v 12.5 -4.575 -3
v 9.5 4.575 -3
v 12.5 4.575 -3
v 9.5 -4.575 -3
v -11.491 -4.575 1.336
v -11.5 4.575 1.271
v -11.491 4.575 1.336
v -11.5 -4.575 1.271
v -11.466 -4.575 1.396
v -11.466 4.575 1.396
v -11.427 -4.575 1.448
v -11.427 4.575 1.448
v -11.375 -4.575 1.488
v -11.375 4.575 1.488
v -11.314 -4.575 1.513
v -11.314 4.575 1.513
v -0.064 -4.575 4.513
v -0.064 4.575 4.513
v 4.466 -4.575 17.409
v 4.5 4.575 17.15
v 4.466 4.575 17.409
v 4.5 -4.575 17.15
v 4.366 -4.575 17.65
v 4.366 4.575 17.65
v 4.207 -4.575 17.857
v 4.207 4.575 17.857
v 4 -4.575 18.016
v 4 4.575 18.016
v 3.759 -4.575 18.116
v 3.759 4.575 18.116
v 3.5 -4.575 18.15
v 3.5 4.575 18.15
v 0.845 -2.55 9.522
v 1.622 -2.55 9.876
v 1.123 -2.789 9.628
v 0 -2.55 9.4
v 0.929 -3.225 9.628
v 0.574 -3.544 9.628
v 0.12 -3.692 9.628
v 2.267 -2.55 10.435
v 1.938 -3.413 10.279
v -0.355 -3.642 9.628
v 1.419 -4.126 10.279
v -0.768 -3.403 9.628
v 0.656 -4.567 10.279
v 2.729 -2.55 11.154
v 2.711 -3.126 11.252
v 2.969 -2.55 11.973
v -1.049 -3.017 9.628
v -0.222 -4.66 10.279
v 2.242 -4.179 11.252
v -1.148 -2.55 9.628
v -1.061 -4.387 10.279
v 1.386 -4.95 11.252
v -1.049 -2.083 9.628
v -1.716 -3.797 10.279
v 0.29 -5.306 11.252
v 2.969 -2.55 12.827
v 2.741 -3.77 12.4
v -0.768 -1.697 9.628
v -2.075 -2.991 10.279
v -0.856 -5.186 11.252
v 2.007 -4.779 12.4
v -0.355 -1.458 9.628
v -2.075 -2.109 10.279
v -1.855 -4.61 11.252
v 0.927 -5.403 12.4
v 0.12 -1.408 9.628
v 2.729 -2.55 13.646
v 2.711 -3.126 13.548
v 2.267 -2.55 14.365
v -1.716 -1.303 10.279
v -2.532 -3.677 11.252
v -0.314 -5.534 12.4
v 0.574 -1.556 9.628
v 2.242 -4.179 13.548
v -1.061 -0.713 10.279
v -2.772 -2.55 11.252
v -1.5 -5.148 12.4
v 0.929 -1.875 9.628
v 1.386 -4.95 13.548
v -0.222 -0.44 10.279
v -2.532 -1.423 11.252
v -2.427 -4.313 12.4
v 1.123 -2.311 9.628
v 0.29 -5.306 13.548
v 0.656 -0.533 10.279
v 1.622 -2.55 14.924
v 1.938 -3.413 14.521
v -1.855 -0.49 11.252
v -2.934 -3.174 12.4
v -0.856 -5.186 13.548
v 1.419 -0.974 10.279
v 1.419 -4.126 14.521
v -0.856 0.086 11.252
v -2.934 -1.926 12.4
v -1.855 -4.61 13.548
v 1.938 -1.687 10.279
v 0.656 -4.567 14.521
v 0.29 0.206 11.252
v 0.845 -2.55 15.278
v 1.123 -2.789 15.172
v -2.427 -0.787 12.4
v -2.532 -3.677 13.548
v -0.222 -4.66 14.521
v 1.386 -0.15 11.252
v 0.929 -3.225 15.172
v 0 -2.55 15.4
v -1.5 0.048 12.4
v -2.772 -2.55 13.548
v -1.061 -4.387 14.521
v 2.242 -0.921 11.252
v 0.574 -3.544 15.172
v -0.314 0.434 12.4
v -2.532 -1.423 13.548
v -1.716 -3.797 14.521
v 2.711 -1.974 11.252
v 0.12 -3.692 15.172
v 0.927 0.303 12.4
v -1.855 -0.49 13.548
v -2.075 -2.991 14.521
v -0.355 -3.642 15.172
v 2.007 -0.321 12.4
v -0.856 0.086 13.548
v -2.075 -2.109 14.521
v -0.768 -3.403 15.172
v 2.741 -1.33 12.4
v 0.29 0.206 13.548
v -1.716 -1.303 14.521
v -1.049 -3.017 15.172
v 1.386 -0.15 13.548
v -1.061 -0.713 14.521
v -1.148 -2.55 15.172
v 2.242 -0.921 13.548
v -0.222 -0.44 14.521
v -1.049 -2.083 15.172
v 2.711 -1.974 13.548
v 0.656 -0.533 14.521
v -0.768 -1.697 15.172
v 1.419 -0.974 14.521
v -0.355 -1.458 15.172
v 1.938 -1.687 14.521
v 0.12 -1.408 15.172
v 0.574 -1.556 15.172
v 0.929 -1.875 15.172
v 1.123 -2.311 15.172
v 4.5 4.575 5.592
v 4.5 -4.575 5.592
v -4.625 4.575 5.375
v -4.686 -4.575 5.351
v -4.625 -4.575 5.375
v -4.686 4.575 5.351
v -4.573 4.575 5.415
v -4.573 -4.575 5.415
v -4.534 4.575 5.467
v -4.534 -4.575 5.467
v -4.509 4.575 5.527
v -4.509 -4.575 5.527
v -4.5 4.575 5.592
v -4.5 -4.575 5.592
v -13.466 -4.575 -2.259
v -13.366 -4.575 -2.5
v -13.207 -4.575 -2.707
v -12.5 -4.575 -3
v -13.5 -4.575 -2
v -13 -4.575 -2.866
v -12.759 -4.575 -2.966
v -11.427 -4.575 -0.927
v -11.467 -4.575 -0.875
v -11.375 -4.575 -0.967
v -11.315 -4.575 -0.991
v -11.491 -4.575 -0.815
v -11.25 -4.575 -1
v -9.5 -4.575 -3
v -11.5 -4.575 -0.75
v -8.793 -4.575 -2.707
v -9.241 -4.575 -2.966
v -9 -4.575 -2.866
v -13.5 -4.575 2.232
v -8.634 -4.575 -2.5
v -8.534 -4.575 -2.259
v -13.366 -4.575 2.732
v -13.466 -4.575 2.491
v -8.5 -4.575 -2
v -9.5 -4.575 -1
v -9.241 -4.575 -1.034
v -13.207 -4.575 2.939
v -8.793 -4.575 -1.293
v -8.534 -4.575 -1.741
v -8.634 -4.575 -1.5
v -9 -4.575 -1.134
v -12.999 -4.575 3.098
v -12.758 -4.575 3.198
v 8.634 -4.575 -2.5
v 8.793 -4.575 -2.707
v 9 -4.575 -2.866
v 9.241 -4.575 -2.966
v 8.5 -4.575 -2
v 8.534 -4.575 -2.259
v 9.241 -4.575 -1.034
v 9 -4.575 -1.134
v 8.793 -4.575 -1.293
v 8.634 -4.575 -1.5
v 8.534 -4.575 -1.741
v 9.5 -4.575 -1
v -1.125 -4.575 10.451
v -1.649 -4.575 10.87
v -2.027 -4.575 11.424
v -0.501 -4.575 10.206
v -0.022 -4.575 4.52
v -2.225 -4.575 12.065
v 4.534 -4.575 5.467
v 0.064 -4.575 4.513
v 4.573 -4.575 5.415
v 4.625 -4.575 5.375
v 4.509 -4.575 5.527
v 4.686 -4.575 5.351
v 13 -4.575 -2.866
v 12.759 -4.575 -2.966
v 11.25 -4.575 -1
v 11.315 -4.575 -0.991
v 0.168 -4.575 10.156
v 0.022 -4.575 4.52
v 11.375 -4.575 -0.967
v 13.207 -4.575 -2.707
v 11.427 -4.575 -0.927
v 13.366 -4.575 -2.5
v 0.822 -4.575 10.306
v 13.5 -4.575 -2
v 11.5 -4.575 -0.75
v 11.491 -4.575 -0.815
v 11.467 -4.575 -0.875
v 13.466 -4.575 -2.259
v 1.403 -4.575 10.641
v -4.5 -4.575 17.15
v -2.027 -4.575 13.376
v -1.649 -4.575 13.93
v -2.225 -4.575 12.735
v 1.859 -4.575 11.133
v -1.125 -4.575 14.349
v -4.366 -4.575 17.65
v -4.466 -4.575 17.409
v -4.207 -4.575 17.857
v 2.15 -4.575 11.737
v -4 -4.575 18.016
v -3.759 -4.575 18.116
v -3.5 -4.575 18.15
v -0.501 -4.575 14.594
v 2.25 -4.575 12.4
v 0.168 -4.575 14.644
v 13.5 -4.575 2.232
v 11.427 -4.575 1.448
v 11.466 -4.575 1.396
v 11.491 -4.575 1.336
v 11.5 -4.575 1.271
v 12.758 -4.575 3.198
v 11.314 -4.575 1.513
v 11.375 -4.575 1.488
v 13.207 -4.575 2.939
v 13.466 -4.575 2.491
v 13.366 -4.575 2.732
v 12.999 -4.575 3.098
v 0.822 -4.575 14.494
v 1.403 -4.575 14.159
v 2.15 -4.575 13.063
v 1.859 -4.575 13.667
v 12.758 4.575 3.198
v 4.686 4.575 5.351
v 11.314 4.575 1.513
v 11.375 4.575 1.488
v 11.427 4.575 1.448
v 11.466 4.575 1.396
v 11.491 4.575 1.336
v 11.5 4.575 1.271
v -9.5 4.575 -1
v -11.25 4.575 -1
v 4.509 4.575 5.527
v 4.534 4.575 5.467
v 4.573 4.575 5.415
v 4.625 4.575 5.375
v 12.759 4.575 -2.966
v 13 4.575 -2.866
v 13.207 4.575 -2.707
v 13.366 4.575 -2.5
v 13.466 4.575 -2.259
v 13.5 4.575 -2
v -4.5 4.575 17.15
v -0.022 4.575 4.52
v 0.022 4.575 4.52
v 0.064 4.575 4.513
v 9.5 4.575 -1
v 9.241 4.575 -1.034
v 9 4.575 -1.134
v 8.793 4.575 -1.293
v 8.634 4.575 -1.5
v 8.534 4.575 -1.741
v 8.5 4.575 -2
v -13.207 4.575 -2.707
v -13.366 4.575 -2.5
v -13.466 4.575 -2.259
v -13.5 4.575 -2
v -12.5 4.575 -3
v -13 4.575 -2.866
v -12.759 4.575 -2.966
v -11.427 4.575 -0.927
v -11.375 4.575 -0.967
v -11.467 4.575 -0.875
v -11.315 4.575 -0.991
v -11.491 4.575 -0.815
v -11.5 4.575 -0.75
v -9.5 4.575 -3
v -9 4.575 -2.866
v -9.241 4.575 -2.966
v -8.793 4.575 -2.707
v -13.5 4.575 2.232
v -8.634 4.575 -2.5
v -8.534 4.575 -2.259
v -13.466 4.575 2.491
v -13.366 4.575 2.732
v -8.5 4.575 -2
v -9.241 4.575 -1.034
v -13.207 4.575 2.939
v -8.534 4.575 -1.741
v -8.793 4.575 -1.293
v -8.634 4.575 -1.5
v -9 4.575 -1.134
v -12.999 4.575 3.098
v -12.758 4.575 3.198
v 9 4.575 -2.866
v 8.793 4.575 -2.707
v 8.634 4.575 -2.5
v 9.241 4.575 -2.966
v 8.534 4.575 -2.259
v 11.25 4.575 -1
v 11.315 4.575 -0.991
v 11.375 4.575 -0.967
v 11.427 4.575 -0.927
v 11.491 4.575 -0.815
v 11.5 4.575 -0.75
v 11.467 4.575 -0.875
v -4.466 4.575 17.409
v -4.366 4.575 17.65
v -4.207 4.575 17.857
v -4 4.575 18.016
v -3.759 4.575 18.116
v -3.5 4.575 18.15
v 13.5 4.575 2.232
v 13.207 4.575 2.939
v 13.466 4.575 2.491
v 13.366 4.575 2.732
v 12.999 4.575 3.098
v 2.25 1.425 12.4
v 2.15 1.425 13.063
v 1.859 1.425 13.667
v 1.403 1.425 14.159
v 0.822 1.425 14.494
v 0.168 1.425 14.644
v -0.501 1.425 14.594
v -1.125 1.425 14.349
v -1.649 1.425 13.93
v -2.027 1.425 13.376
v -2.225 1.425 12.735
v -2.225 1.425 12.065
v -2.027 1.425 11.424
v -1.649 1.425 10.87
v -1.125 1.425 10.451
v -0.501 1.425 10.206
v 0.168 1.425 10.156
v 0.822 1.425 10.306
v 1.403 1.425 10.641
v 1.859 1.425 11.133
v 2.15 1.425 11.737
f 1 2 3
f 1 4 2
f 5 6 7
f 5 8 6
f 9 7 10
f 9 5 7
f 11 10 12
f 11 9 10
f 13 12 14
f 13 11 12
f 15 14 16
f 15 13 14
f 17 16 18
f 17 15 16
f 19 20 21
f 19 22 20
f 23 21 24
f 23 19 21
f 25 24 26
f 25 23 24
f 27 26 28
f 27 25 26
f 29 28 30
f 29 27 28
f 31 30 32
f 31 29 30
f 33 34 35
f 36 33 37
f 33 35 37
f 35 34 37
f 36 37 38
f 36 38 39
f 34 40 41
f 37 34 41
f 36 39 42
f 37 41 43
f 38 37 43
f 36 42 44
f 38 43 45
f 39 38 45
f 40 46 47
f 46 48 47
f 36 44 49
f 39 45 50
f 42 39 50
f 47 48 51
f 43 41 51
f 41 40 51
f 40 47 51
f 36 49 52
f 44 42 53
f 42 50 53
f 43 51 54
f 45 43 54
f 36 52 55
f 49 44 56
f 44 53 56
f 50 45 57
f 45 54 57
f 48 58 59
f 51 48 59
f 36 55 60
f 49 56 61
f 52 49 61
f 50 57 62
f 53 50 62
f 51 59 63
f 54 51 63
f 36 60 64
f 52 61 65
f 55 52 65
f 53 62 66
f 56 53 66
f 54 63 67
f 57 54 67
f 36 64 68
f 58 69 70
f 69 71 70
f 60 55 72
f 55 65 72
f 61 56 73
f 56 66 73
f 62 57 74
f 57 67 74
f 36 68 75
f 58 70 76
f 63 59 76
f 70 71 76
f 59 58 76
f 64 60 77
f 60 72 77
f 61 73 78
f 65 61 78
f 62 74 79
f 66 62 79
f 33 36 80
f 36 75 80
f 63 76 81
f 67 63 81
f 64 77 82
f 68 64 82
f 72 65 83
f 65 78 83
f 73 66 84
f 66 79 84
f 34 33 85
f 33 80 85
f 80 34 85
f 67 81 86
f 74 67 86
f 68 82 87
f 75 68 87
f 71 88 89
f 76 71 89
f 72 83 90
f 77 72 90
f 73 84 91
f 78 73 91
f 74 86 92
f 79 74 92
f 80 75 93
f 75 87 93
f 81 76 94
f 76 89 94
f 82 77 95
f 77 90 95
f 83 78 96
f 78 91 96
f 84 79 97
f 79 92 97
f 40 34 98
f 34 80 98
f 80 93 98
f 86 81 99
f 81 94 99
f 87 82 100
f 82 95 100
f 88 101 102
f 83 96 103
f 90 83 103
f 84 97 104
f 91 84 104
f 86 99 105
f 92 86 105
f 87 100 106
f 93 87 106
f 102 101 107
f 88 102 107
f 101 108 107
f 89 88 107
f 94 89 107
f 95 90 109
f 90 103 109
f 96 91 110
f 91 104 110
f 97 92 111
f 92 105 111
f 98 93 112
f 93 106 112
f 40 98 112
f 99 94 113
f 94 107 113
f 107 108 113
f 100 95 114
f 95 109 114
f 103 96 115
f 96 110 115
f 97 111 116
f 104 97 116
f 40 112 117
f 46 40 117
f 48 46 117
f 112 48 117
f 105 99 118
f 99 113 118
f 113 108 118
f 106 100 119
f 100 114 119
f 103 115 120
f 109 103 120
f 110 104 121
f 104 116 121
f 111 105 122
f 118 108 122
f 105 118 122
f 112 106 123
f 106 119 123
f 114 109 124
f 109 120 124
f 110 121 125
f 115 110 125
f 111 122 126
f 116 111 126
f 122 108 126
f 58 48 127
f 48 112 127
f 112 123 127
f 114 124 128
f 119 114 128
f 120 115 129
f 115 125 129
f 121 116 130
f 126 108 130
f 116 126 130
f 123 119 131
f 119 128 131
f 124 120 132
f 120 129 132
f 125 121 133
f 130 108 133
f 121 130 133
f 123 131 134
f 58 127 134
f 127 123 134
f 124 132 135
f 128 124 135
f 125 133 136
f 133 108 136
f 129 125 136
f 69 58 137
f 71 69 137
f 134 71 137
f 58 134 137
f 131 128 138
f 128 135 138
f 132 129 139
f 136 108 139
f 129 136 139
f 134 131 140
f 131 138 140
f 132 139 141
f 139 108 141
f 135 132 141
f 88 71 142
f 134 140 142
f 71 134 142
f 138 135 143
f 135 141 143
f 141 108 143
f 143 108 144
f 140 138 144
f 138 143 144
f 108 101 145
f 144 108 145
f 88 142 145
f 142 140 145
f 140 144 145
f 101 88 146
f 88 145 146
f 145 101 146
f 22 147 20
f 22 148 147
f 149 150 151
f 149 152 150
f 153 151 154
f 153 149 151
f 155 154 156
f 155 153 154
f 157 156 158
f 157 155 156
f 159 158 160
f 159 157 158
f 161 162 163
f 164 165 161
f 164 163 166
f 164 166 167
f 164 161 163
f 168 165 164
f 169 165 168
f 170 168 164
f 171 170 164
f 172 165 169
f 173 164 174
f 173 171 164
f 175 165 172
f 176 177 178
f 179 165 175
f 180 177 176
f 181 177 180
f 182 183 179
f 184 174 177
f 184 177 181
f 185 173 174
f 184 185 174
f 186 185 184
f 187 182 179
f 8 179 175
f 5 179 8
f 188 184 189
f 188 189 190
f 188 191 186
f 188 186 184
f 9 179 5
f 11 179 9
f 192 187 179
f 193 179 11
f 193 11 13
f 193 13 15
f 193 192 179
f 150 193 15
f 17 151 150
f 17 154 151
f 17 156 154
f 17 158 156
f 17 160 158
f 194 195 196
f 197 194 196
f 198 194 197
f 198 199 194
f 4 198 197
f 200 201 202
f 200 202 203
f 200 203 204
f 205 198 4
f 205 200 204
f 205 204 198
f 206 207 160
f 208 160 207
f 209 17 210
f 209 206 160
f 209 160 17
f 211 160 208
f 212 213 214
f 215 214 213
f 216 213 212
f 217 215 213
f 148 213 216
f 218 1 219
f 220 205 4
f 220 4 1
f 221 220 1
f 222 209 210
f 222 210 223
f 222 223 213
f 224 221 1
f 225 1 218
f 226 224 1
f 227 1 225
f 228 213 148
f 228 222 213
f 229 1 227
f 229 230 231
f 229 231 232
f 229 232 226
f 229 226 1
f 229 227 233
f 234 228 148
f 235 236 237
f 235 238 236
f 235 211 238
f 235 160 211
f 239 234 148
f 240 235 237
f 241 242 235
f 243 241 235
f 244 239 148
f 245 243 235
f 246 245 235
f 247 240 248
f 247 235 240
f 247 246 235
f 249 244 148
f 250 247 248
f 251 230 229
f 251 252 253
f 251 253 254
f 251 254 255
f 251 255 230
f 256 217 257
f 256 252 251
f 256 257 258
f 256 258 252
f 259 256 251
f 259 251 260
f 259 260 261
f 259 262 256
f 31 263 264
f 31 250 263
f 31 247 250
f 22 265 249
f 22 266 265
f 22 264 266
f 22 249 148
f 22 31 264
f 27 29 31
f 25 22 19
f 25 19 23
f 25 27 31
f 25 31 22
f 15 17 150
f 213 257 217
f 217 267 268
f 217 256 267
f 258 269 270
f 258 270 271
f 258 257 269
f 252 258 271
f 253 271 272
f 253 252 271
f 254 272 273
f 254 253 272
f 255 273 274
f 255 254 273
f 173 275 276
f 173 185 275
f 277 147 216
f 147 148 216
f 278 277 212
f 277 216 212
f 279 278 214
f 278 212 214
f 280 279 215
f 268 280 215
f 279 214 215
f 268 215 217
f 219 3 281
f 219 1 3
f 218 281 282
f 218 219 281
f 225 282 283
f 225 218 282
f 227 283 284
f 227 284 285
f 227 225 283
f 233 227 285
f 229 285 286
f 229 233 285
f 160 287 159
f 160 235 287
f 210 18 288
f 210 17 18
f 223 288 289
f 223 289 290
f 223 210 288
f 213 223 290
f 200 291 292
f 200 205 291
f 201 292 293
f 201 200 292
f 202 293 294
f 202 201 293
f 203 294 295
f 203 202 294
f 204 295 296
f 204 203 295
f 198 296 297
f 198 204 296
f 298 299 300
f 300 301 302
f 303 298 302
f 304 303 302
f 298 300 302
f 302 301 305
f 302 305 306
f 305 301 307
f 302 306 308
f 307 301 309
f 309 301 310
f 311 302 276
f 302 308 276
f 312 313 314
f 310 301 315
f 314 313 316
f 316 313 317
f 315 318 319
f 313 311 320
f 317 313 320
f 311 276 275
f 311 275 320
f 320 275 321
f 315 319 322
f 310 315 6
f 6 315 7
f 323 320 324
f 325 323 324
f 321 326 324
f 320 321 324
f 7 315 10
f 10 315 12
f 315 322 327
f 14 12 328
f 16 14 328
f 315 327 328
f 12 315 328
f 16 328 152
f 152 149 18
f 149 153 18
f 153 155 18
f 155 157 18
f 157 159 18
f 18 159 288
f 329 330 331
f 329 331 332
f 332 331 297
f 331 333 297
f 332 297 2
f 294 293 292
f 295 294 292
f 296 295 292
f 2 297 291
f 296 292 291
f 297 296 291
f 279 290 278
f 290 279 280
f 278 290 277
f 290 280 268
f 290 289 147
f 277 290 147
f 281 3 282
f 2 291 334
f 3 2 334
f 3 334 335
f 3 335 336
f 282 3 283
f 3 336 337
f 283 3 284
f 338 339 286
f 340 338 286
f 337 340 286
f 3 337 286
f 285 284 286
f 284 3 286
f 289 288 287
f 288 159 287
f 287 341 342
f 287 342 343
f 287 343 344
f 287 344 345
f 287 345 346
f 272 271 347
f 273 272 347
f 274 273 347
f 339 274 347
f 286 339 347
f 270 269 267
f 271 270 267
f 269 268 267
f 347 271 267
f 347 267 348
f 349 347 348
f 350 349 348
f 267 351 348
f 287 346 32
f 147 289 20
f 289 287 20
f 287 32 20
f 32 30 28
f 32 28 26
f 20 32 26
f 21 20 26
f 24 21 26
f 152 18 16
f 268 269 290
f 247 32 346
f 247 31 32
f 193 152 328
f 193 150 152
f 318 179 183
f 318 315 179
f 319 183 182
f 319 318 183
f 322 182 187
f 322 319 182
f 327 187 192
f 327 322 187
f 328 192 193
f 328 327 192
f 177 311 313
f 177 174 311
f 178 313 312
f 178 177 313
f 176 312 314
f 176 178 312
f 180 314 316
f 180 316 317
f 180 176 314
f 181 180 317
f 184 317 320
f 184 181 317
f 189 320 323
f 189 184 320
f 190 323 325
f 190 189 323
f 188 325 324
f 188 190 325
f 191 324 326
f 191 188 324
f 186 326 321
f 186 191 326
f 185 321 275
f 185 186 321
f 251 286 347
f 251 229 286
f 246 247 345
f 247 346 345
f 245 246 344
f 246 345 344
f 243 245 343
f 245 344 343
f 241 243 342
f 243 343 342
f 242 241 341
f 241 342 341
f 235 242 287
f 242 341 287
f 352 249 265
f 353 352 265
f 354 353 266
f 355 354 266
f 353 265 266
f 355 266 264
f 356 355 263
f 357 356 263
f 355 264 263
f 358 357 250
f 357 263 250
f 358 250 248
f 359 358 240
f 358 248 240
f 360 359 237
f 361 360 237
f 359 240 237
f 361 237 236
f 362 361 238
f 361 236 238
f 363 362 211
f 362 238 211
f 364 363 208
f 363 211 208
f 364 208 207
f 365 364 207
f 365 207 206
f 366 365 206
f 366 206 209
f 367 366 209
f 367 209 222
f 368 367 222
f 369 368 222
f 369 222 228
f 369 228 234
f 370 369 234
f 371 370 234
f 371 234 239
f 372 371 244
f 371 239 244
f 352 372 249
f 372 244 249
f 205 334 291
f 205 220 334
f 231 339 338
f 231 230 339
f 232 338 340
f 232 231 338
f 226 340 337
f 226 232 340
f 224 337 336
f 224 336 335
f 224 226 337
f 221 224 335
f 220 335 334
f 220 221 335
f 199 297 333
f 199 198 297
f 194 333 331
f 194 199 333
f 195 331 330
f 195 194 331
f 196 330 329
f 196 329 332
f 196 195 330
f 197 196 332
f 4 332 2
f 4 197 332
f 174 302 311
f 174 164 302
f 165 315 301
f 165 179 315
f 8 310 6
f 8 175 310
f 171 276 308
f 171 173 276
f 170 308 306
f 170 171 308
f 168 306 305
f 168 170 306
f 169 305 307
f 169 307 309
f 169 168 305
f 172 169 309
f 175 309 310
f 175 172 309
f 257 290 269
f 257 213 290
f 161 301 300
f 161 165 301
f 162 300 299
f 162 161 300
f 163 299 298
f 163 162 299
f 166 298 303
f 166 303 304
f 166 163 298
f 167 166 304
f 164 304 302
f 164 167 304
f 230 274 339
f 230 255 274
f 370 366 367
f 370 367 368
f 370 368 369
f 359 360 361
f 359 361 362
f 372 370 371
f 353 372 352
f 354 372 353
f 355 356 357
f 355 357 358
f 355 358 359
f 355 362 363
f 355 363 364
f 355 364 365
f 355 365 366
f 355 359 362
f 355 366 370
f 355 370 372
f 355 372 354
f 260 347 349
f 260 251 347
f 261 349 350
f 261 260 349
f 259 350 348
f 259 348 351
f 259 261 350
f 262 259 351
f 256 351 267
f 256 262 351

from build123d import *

# Parameters (mm, degrees)
F1_DEPTH      = 4.575
F1_DEPTH_BACK = 4.575
F2_R          = 2.25
F3_DEPTH      = 6
F4_R          = 0.99999
F5_R          = 0.25


# Not quite as in the source:
# - a fillet or chamfer is up to 0.001 mm smaller than in the source, because OpenCascade refuses the exact size


with BuildPart() as f1:
    # F0 (on Front) → F1 (new body, two sides)
    with BuildSketch(Plane.XZ) as f1_sk:
        Polygon((-13.5, 3), (-13.5, -3), (-8.5, -3), (-8.5, -1), (-11.5, -1), (-11.5, 1.4634433738), (0, 4.5301100405), (11.5, 1.4634433738), (11.5, -1), (8.5, -1), (8.5, -3), (13.5, -3), (13.5, 3), (4.5, 5.4), (4.5, 18.15), (-4.5, 18.15), (-4.5, 5.4), align=None)
    extrude(amount=F1_DEPTH)
    extrude(f1_sk.sketch, amount=-F1_DEPTH_BACK)

    # F2 (on face) → F3 (cut)
    with BuildSketch(Plane.XZ.offset(4.575)):
        with Locations((0, 12.4)):
            Circle(F2_R)
    extrude(amount=-F3_DEPTH, mode=Mode.SUBTRACT)

    # F4 (radius 1 in the source; OpenCascade refuses exactly that, so slightly less here)
    f4_edges = [f1.edges().sort_by_distance(p)[0] for p in [
        (-4.5, 0, 18.15),
        (4.5, 0, 18.15),
        (13.5, 0, 3),
        (13.5, 0, -3),
        (8.5, 0, -3),
        (8.5, 0, -1),
        (-8.5, 0, -3),
        (-8.5, 0, -1),
        (-13.5, 0, 3),
        (-13.5, 0, -3),
    ]]
    fillet(f4_edges, radius=F4_R)

    # F5
    f5_edges = [f1.edges().sort_by_distance(p)[0] for p in [
        (4.5, 0, 5.4),
        (-11.5, 0, -1),
        (-11.5, 0, 1.463443),
        (11.5, 0, -1),
        (11.5, 0, 1.463443),
        (0, 0, 4.53011),
        (-4.5, 0, 5.4),
    ]]
    fillet(f5_edges, radius=F5_R)


with BuildPart() as f8:
    # F7 (on offset) → F8 (revolve)
    with BuildSketch(Plane.XZ.offset(2.55)):
        with BuildLine():
            Line((0, 15.4), (0, 9.4))
            ThreePointArc((0, 9.4), (3, 12.4), (0, 15.4))
        make_face()
    revolve(axis=Axis((0, -2.55, 12.4), (0, 0, -1)))


solid = Compound([f1.part, f8.part])
